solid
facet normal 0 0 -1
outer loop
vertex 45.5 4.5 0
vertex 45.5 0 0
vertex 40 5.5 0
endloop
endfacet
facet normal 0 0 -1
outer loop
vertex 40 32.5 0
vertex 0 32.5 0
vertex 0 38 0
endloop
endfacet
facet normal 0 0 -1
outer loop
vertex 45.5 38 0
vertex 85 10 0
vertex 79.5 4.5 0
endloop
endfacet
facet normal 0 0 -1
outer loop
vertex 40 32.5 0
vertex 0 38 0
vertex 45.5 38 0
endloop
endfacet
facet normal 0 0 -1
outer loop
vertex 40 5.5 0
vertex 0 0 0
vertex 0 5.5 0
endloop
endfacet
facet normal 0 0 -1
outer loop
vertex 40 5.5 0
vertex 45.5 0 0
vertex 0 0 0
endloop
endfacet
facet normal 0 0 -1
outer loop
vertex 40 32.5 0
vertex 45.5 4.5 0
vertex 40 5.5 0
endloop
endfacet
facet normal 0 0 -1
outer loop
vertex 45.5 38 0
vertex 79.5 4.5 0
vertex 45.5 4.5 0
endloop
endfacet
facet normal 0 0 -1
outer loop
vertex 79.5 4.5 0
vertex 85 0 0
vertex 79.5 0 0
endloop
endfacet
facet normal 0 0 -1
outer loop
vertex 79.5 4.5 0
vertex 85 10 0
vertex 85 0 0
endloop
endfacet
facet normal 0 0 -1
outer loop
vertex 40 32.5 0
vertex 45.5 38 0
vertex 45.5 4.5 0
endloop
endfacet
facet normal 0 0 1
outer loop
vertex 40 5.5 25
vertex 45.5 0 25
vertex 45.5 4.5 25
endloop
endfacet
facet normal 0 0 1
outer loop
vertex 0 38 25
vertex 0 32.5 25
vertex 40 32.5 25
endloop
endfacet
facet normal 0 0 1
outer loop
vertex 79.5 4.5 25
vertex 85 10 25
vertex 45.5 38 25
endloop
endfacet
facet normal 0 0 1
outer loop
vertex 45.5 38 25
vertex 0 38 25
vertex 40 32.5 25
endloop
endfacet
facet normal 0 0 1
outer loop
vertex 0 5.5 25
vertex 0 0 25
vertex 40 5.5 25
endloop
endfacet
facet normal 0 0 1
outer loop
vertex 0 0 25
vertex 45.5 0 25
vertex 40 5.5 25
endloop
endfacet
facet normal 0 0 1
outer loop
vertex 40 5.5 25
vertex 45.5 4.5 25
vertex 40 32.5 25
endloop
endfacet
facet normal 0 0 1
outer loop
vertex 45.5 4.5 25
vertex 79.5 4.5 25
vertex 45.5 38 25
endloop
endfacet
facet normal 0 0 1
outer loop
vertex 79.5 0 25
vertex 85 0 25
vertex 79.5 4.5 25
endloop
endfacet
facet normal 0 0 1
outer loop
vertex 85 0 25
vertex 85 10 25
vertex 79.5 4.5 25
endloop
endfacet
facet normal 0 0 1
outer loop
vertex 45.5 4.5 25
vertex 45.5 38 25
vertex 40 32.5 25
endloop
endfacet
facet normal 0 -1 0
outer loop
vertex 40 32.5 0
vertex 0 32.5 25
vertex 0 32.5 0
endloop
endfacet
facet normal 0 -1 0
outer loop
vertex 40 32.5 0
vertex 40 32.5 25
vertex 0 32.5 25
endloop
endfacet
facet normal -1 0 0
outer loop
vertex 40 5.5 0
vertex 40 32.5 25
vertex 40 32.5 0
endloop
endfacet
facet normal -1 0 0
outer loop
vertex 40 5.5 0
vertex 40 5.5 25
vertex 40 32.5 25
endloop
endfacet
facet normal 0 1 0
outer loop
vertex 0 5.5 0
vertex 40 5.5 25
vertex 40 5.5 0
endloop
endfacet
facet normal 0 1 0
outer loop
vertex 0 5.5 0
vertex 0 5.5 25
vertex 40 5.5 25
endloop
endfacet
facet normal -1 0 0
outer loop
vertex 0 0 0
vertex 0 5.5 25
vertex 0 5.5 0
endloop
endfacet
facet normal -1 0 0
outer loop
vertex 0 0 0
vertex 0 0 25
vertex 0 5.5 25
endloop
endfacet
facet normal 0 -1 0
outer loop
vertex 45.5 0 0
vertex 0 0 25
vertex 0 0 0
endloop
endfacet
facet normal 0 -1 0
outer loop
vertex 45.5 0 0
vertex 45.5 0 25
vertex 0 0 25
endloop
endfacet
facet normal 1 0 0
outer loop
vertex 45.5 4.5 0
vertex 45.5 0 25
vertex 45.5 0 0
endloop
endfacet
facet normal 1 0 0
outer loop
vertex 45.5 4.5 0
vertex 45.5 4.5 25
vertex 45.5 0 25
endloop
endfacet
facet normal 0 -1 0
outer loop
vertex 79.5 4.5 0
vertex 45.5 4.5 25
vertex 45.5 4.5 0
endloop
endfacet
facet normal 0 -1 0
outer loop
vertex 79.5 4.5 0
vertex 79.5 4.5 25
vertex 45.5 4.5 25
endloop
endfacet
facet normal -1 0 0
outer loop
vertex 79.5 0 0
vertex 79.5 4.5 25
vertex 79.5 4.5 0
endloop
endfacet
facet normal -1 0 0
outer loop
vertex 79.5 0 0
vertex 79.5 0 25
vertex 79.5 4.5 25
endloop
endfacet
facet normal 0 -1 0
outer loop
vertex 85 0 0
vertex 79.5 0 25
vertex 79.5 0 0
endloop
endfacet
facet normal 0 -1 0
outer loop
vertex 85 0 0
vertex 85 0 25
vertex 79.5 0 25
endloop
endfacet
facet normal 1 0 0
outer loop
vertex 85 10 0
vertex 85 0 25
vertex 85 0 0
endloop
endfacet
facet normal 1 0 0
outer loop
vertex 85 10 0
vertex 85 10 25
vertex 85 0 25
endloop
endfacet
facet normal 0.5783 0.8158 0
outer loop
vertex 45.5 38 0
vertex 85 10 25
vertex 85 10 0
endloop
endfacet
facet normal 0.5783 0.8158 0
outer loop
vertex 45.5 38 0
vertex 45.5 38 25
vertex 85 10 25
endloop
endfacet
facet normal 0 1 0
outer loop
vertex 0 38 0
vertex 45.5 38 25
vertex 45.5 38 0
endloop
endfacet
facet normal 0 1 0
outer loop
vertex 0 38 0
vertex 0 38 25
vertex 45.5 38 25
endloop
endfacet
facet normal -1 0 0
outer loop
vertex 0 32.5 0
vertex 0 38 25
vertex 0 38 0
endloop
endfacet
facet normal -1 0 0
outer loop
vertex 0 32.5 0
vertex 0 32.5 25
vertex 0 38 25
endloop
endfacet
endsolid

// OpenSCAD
// preview[view:north, tilt:top]

/* [Table] */
// How thick is your table plate?
table_thickness = 27; // [5:50]

/* [Headphone] */
// How height is your Headphones bracket?
headphone_height = 4.5;
// How width is your Headphones bracket?
headphone_widht = 34;

/* [Hidden] */
holder_width = 25;
holder_thikness = 5.5;
holder_lenght = 40;

// Print HeadPhone Holder
HeadPholeHolder();

module HeadPholeHolder(){
    linear_extrude(height = holder_width){
        HeadPholeHolderSideView();
    }
}

module HeadPholeHolderSideView(){
    difference(){
        square ([holder_lenght, holder_thikness * 2 + table_thickness]);
        translate([0, holder_thikness])
            square ([holder_lenght, table_thickness]);
    }
    difference(){
        translate([holder_lenght, 0]){
            square([holder_thikness, holder_thikness * 2 + table_thickness]);
            square([holder_thikness * 2 + headphone_widht, headphone_height + holder_thikness]);
        }
        translate([holder_lenght + holder_thikness, 0]){
            square([headphone_widht, headphone_height]);
        }
    }
    polygon(points=[[holder_lenght + holder_thikness, headphone_height + holder_thikness], 
        [holder_lenght + 2 * holder_thikness + headphone_widht, headphone_height + holder_thikness], 
        [holder_lenght + holder_thikness, holder_thikness * 2 + table_thickness]]);
}
